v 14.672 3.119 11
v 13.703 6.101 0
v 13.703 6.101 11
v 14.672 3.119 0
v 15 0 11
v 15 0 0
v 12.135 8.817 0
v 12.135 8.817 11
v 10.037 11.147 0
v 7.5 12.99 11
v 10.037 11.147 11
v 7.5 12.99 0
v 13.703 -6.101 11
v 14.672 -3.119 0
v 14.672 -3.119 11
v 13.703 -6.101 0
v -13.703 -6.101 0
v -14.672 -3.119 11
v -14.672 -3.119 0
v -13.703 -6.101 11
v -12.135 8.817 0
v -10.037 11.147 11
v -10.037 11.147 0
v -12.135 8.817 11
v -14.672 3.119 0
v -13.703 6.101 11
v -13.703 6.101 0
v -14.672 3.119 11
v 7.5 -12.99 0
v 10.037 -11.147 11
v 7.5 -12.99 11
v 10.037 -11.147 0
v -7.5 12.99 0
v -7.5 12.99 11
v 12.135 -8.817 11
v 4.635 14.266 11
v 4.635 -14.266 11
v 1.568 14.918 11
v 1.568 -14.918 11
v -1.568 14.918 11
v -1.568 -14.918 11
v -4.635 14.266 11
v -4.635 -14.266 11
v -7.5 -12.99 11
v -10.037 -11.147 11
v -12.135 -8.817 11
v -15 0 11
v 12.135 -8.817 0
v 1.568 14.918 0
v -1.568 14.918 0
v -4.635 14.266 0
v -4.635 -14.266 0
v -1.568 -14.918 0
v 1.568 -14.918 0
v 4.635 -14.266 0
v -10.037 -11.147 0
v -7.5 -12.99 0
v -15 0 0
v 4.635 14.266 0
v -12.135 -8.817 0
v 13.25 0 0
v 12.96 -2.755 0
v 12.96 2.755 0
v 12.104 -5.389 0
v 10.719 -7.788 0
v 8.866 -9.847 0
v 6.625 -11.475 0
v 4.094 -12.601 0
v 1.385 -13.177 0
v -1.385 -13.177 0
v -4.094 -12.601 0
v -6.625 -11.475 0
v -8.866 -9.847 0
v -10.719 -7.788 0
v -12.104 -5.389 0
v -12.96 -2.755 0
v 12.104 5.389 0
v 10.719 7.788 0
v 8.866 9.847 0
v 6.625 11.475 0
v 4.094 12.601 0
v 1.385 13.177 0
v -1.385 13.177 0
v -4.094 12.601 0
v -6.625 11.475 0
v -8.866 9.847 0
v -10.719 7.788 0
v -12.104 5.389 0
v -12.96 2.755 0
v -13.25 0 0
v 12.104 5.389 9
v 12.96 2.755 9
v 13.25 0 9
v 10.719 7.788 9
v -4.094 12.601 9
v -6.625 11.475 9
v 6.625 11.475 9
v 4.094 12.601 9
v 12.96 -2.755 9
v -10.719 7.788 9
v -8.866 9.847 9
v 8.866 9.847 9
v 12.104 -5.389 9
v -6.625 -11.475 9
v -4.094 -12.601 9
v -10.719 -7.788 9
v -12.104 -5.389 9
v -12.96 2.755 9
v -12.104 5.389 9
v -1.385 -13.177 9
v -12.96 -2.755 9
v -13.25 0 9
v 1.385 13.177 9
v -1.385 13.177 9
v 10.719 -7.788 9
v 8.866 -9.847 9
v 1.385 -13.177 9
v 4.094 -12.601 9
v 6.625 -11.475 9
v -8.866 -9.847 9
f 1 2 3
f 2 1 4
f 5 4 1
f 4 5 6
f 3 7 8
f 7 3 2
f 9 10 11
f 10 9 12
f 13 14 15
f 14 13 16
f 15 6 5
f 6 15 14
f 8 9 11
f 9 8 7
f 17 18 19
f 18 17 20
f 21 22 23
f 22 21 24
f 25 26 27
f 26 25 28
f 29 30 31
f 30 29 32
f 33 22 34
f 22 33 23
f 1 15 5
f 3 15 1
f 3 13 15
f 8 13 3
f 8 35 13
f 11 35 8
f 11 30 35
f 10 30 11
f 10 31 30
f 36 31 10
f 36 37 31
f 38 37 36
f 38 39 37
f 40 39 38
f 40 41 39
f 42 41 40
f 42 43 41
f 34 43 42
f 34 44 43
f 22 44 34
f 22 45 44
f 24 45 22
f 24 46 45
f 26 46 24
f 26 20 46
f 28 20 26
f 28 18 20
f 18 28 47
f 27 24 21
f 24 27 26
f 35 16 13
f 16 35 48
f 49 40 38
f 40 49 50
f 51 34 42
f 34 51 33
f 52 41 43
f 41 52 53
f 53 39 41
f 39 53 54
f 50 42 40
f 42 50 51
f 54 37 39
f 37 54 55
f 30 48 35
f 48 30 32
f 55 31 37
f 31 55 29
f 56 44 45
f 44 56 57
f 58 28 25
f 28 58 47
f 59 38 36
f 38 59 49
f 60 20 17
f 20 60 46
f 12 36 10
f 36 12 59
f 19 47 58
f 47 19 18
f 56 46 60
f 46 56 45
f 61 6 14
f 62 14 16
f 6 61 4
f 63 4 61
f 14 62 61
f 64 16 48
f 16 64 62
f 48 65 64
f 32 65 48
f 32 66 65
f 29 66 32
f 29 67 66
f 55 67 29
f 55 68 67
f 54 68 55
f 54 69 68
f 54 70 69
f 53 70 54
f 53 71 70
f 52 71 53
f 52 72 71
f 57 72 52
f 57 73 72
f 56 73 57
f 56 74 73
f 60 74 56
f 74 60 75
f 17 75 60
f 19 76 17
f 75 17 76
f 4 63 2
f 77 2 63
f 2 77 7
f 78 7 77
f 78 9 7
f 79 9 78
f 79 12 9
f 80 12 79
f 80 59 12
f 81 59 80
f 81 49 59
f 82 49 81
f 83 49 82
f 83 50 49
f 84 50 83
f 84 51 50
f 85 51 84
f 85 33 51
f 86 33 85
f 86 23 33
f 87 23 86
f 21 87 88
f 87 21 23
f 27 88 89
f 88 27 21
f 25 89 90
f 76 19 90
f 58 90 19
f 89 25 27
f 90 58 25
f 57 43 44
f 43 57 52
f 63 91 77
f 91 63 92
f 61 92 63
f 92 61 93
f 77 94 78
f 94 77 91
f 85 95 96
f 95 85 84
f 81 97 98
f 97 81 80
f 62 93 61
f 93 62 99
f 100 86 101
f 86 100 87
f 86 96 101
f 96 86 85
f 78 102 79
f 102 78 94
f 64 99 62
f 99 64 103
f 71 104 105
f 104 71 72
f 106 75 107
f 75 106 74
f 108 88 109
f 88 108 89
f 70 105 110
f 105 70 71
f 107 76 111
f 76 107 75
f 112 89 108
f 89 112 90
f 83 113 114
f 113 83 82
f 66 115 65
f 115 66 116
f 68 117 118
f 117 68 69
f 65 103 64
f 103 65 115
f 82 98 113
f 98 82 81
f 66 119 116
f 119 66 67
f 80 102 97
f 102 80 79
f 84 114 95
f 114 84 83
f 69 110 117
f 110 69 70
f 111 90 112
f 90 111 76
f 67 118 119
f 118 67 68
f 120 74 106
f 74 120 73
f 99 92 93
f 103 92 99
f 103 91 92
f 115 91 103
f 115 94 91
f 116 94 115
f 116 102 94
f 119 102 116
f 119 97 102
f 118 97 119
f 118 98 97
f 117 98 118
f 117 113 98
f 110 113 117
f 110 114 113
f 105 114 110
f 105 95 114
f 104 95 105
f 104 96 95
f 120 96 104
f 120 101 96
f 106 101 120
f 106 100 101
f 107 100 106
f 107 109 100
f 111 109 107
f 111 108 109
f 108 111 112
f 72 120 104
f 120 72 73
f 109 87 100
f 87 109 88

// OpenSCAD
difference() {
    cylinder(h=11, d=30);
    cylinder(h=9, d=26.5);
}
